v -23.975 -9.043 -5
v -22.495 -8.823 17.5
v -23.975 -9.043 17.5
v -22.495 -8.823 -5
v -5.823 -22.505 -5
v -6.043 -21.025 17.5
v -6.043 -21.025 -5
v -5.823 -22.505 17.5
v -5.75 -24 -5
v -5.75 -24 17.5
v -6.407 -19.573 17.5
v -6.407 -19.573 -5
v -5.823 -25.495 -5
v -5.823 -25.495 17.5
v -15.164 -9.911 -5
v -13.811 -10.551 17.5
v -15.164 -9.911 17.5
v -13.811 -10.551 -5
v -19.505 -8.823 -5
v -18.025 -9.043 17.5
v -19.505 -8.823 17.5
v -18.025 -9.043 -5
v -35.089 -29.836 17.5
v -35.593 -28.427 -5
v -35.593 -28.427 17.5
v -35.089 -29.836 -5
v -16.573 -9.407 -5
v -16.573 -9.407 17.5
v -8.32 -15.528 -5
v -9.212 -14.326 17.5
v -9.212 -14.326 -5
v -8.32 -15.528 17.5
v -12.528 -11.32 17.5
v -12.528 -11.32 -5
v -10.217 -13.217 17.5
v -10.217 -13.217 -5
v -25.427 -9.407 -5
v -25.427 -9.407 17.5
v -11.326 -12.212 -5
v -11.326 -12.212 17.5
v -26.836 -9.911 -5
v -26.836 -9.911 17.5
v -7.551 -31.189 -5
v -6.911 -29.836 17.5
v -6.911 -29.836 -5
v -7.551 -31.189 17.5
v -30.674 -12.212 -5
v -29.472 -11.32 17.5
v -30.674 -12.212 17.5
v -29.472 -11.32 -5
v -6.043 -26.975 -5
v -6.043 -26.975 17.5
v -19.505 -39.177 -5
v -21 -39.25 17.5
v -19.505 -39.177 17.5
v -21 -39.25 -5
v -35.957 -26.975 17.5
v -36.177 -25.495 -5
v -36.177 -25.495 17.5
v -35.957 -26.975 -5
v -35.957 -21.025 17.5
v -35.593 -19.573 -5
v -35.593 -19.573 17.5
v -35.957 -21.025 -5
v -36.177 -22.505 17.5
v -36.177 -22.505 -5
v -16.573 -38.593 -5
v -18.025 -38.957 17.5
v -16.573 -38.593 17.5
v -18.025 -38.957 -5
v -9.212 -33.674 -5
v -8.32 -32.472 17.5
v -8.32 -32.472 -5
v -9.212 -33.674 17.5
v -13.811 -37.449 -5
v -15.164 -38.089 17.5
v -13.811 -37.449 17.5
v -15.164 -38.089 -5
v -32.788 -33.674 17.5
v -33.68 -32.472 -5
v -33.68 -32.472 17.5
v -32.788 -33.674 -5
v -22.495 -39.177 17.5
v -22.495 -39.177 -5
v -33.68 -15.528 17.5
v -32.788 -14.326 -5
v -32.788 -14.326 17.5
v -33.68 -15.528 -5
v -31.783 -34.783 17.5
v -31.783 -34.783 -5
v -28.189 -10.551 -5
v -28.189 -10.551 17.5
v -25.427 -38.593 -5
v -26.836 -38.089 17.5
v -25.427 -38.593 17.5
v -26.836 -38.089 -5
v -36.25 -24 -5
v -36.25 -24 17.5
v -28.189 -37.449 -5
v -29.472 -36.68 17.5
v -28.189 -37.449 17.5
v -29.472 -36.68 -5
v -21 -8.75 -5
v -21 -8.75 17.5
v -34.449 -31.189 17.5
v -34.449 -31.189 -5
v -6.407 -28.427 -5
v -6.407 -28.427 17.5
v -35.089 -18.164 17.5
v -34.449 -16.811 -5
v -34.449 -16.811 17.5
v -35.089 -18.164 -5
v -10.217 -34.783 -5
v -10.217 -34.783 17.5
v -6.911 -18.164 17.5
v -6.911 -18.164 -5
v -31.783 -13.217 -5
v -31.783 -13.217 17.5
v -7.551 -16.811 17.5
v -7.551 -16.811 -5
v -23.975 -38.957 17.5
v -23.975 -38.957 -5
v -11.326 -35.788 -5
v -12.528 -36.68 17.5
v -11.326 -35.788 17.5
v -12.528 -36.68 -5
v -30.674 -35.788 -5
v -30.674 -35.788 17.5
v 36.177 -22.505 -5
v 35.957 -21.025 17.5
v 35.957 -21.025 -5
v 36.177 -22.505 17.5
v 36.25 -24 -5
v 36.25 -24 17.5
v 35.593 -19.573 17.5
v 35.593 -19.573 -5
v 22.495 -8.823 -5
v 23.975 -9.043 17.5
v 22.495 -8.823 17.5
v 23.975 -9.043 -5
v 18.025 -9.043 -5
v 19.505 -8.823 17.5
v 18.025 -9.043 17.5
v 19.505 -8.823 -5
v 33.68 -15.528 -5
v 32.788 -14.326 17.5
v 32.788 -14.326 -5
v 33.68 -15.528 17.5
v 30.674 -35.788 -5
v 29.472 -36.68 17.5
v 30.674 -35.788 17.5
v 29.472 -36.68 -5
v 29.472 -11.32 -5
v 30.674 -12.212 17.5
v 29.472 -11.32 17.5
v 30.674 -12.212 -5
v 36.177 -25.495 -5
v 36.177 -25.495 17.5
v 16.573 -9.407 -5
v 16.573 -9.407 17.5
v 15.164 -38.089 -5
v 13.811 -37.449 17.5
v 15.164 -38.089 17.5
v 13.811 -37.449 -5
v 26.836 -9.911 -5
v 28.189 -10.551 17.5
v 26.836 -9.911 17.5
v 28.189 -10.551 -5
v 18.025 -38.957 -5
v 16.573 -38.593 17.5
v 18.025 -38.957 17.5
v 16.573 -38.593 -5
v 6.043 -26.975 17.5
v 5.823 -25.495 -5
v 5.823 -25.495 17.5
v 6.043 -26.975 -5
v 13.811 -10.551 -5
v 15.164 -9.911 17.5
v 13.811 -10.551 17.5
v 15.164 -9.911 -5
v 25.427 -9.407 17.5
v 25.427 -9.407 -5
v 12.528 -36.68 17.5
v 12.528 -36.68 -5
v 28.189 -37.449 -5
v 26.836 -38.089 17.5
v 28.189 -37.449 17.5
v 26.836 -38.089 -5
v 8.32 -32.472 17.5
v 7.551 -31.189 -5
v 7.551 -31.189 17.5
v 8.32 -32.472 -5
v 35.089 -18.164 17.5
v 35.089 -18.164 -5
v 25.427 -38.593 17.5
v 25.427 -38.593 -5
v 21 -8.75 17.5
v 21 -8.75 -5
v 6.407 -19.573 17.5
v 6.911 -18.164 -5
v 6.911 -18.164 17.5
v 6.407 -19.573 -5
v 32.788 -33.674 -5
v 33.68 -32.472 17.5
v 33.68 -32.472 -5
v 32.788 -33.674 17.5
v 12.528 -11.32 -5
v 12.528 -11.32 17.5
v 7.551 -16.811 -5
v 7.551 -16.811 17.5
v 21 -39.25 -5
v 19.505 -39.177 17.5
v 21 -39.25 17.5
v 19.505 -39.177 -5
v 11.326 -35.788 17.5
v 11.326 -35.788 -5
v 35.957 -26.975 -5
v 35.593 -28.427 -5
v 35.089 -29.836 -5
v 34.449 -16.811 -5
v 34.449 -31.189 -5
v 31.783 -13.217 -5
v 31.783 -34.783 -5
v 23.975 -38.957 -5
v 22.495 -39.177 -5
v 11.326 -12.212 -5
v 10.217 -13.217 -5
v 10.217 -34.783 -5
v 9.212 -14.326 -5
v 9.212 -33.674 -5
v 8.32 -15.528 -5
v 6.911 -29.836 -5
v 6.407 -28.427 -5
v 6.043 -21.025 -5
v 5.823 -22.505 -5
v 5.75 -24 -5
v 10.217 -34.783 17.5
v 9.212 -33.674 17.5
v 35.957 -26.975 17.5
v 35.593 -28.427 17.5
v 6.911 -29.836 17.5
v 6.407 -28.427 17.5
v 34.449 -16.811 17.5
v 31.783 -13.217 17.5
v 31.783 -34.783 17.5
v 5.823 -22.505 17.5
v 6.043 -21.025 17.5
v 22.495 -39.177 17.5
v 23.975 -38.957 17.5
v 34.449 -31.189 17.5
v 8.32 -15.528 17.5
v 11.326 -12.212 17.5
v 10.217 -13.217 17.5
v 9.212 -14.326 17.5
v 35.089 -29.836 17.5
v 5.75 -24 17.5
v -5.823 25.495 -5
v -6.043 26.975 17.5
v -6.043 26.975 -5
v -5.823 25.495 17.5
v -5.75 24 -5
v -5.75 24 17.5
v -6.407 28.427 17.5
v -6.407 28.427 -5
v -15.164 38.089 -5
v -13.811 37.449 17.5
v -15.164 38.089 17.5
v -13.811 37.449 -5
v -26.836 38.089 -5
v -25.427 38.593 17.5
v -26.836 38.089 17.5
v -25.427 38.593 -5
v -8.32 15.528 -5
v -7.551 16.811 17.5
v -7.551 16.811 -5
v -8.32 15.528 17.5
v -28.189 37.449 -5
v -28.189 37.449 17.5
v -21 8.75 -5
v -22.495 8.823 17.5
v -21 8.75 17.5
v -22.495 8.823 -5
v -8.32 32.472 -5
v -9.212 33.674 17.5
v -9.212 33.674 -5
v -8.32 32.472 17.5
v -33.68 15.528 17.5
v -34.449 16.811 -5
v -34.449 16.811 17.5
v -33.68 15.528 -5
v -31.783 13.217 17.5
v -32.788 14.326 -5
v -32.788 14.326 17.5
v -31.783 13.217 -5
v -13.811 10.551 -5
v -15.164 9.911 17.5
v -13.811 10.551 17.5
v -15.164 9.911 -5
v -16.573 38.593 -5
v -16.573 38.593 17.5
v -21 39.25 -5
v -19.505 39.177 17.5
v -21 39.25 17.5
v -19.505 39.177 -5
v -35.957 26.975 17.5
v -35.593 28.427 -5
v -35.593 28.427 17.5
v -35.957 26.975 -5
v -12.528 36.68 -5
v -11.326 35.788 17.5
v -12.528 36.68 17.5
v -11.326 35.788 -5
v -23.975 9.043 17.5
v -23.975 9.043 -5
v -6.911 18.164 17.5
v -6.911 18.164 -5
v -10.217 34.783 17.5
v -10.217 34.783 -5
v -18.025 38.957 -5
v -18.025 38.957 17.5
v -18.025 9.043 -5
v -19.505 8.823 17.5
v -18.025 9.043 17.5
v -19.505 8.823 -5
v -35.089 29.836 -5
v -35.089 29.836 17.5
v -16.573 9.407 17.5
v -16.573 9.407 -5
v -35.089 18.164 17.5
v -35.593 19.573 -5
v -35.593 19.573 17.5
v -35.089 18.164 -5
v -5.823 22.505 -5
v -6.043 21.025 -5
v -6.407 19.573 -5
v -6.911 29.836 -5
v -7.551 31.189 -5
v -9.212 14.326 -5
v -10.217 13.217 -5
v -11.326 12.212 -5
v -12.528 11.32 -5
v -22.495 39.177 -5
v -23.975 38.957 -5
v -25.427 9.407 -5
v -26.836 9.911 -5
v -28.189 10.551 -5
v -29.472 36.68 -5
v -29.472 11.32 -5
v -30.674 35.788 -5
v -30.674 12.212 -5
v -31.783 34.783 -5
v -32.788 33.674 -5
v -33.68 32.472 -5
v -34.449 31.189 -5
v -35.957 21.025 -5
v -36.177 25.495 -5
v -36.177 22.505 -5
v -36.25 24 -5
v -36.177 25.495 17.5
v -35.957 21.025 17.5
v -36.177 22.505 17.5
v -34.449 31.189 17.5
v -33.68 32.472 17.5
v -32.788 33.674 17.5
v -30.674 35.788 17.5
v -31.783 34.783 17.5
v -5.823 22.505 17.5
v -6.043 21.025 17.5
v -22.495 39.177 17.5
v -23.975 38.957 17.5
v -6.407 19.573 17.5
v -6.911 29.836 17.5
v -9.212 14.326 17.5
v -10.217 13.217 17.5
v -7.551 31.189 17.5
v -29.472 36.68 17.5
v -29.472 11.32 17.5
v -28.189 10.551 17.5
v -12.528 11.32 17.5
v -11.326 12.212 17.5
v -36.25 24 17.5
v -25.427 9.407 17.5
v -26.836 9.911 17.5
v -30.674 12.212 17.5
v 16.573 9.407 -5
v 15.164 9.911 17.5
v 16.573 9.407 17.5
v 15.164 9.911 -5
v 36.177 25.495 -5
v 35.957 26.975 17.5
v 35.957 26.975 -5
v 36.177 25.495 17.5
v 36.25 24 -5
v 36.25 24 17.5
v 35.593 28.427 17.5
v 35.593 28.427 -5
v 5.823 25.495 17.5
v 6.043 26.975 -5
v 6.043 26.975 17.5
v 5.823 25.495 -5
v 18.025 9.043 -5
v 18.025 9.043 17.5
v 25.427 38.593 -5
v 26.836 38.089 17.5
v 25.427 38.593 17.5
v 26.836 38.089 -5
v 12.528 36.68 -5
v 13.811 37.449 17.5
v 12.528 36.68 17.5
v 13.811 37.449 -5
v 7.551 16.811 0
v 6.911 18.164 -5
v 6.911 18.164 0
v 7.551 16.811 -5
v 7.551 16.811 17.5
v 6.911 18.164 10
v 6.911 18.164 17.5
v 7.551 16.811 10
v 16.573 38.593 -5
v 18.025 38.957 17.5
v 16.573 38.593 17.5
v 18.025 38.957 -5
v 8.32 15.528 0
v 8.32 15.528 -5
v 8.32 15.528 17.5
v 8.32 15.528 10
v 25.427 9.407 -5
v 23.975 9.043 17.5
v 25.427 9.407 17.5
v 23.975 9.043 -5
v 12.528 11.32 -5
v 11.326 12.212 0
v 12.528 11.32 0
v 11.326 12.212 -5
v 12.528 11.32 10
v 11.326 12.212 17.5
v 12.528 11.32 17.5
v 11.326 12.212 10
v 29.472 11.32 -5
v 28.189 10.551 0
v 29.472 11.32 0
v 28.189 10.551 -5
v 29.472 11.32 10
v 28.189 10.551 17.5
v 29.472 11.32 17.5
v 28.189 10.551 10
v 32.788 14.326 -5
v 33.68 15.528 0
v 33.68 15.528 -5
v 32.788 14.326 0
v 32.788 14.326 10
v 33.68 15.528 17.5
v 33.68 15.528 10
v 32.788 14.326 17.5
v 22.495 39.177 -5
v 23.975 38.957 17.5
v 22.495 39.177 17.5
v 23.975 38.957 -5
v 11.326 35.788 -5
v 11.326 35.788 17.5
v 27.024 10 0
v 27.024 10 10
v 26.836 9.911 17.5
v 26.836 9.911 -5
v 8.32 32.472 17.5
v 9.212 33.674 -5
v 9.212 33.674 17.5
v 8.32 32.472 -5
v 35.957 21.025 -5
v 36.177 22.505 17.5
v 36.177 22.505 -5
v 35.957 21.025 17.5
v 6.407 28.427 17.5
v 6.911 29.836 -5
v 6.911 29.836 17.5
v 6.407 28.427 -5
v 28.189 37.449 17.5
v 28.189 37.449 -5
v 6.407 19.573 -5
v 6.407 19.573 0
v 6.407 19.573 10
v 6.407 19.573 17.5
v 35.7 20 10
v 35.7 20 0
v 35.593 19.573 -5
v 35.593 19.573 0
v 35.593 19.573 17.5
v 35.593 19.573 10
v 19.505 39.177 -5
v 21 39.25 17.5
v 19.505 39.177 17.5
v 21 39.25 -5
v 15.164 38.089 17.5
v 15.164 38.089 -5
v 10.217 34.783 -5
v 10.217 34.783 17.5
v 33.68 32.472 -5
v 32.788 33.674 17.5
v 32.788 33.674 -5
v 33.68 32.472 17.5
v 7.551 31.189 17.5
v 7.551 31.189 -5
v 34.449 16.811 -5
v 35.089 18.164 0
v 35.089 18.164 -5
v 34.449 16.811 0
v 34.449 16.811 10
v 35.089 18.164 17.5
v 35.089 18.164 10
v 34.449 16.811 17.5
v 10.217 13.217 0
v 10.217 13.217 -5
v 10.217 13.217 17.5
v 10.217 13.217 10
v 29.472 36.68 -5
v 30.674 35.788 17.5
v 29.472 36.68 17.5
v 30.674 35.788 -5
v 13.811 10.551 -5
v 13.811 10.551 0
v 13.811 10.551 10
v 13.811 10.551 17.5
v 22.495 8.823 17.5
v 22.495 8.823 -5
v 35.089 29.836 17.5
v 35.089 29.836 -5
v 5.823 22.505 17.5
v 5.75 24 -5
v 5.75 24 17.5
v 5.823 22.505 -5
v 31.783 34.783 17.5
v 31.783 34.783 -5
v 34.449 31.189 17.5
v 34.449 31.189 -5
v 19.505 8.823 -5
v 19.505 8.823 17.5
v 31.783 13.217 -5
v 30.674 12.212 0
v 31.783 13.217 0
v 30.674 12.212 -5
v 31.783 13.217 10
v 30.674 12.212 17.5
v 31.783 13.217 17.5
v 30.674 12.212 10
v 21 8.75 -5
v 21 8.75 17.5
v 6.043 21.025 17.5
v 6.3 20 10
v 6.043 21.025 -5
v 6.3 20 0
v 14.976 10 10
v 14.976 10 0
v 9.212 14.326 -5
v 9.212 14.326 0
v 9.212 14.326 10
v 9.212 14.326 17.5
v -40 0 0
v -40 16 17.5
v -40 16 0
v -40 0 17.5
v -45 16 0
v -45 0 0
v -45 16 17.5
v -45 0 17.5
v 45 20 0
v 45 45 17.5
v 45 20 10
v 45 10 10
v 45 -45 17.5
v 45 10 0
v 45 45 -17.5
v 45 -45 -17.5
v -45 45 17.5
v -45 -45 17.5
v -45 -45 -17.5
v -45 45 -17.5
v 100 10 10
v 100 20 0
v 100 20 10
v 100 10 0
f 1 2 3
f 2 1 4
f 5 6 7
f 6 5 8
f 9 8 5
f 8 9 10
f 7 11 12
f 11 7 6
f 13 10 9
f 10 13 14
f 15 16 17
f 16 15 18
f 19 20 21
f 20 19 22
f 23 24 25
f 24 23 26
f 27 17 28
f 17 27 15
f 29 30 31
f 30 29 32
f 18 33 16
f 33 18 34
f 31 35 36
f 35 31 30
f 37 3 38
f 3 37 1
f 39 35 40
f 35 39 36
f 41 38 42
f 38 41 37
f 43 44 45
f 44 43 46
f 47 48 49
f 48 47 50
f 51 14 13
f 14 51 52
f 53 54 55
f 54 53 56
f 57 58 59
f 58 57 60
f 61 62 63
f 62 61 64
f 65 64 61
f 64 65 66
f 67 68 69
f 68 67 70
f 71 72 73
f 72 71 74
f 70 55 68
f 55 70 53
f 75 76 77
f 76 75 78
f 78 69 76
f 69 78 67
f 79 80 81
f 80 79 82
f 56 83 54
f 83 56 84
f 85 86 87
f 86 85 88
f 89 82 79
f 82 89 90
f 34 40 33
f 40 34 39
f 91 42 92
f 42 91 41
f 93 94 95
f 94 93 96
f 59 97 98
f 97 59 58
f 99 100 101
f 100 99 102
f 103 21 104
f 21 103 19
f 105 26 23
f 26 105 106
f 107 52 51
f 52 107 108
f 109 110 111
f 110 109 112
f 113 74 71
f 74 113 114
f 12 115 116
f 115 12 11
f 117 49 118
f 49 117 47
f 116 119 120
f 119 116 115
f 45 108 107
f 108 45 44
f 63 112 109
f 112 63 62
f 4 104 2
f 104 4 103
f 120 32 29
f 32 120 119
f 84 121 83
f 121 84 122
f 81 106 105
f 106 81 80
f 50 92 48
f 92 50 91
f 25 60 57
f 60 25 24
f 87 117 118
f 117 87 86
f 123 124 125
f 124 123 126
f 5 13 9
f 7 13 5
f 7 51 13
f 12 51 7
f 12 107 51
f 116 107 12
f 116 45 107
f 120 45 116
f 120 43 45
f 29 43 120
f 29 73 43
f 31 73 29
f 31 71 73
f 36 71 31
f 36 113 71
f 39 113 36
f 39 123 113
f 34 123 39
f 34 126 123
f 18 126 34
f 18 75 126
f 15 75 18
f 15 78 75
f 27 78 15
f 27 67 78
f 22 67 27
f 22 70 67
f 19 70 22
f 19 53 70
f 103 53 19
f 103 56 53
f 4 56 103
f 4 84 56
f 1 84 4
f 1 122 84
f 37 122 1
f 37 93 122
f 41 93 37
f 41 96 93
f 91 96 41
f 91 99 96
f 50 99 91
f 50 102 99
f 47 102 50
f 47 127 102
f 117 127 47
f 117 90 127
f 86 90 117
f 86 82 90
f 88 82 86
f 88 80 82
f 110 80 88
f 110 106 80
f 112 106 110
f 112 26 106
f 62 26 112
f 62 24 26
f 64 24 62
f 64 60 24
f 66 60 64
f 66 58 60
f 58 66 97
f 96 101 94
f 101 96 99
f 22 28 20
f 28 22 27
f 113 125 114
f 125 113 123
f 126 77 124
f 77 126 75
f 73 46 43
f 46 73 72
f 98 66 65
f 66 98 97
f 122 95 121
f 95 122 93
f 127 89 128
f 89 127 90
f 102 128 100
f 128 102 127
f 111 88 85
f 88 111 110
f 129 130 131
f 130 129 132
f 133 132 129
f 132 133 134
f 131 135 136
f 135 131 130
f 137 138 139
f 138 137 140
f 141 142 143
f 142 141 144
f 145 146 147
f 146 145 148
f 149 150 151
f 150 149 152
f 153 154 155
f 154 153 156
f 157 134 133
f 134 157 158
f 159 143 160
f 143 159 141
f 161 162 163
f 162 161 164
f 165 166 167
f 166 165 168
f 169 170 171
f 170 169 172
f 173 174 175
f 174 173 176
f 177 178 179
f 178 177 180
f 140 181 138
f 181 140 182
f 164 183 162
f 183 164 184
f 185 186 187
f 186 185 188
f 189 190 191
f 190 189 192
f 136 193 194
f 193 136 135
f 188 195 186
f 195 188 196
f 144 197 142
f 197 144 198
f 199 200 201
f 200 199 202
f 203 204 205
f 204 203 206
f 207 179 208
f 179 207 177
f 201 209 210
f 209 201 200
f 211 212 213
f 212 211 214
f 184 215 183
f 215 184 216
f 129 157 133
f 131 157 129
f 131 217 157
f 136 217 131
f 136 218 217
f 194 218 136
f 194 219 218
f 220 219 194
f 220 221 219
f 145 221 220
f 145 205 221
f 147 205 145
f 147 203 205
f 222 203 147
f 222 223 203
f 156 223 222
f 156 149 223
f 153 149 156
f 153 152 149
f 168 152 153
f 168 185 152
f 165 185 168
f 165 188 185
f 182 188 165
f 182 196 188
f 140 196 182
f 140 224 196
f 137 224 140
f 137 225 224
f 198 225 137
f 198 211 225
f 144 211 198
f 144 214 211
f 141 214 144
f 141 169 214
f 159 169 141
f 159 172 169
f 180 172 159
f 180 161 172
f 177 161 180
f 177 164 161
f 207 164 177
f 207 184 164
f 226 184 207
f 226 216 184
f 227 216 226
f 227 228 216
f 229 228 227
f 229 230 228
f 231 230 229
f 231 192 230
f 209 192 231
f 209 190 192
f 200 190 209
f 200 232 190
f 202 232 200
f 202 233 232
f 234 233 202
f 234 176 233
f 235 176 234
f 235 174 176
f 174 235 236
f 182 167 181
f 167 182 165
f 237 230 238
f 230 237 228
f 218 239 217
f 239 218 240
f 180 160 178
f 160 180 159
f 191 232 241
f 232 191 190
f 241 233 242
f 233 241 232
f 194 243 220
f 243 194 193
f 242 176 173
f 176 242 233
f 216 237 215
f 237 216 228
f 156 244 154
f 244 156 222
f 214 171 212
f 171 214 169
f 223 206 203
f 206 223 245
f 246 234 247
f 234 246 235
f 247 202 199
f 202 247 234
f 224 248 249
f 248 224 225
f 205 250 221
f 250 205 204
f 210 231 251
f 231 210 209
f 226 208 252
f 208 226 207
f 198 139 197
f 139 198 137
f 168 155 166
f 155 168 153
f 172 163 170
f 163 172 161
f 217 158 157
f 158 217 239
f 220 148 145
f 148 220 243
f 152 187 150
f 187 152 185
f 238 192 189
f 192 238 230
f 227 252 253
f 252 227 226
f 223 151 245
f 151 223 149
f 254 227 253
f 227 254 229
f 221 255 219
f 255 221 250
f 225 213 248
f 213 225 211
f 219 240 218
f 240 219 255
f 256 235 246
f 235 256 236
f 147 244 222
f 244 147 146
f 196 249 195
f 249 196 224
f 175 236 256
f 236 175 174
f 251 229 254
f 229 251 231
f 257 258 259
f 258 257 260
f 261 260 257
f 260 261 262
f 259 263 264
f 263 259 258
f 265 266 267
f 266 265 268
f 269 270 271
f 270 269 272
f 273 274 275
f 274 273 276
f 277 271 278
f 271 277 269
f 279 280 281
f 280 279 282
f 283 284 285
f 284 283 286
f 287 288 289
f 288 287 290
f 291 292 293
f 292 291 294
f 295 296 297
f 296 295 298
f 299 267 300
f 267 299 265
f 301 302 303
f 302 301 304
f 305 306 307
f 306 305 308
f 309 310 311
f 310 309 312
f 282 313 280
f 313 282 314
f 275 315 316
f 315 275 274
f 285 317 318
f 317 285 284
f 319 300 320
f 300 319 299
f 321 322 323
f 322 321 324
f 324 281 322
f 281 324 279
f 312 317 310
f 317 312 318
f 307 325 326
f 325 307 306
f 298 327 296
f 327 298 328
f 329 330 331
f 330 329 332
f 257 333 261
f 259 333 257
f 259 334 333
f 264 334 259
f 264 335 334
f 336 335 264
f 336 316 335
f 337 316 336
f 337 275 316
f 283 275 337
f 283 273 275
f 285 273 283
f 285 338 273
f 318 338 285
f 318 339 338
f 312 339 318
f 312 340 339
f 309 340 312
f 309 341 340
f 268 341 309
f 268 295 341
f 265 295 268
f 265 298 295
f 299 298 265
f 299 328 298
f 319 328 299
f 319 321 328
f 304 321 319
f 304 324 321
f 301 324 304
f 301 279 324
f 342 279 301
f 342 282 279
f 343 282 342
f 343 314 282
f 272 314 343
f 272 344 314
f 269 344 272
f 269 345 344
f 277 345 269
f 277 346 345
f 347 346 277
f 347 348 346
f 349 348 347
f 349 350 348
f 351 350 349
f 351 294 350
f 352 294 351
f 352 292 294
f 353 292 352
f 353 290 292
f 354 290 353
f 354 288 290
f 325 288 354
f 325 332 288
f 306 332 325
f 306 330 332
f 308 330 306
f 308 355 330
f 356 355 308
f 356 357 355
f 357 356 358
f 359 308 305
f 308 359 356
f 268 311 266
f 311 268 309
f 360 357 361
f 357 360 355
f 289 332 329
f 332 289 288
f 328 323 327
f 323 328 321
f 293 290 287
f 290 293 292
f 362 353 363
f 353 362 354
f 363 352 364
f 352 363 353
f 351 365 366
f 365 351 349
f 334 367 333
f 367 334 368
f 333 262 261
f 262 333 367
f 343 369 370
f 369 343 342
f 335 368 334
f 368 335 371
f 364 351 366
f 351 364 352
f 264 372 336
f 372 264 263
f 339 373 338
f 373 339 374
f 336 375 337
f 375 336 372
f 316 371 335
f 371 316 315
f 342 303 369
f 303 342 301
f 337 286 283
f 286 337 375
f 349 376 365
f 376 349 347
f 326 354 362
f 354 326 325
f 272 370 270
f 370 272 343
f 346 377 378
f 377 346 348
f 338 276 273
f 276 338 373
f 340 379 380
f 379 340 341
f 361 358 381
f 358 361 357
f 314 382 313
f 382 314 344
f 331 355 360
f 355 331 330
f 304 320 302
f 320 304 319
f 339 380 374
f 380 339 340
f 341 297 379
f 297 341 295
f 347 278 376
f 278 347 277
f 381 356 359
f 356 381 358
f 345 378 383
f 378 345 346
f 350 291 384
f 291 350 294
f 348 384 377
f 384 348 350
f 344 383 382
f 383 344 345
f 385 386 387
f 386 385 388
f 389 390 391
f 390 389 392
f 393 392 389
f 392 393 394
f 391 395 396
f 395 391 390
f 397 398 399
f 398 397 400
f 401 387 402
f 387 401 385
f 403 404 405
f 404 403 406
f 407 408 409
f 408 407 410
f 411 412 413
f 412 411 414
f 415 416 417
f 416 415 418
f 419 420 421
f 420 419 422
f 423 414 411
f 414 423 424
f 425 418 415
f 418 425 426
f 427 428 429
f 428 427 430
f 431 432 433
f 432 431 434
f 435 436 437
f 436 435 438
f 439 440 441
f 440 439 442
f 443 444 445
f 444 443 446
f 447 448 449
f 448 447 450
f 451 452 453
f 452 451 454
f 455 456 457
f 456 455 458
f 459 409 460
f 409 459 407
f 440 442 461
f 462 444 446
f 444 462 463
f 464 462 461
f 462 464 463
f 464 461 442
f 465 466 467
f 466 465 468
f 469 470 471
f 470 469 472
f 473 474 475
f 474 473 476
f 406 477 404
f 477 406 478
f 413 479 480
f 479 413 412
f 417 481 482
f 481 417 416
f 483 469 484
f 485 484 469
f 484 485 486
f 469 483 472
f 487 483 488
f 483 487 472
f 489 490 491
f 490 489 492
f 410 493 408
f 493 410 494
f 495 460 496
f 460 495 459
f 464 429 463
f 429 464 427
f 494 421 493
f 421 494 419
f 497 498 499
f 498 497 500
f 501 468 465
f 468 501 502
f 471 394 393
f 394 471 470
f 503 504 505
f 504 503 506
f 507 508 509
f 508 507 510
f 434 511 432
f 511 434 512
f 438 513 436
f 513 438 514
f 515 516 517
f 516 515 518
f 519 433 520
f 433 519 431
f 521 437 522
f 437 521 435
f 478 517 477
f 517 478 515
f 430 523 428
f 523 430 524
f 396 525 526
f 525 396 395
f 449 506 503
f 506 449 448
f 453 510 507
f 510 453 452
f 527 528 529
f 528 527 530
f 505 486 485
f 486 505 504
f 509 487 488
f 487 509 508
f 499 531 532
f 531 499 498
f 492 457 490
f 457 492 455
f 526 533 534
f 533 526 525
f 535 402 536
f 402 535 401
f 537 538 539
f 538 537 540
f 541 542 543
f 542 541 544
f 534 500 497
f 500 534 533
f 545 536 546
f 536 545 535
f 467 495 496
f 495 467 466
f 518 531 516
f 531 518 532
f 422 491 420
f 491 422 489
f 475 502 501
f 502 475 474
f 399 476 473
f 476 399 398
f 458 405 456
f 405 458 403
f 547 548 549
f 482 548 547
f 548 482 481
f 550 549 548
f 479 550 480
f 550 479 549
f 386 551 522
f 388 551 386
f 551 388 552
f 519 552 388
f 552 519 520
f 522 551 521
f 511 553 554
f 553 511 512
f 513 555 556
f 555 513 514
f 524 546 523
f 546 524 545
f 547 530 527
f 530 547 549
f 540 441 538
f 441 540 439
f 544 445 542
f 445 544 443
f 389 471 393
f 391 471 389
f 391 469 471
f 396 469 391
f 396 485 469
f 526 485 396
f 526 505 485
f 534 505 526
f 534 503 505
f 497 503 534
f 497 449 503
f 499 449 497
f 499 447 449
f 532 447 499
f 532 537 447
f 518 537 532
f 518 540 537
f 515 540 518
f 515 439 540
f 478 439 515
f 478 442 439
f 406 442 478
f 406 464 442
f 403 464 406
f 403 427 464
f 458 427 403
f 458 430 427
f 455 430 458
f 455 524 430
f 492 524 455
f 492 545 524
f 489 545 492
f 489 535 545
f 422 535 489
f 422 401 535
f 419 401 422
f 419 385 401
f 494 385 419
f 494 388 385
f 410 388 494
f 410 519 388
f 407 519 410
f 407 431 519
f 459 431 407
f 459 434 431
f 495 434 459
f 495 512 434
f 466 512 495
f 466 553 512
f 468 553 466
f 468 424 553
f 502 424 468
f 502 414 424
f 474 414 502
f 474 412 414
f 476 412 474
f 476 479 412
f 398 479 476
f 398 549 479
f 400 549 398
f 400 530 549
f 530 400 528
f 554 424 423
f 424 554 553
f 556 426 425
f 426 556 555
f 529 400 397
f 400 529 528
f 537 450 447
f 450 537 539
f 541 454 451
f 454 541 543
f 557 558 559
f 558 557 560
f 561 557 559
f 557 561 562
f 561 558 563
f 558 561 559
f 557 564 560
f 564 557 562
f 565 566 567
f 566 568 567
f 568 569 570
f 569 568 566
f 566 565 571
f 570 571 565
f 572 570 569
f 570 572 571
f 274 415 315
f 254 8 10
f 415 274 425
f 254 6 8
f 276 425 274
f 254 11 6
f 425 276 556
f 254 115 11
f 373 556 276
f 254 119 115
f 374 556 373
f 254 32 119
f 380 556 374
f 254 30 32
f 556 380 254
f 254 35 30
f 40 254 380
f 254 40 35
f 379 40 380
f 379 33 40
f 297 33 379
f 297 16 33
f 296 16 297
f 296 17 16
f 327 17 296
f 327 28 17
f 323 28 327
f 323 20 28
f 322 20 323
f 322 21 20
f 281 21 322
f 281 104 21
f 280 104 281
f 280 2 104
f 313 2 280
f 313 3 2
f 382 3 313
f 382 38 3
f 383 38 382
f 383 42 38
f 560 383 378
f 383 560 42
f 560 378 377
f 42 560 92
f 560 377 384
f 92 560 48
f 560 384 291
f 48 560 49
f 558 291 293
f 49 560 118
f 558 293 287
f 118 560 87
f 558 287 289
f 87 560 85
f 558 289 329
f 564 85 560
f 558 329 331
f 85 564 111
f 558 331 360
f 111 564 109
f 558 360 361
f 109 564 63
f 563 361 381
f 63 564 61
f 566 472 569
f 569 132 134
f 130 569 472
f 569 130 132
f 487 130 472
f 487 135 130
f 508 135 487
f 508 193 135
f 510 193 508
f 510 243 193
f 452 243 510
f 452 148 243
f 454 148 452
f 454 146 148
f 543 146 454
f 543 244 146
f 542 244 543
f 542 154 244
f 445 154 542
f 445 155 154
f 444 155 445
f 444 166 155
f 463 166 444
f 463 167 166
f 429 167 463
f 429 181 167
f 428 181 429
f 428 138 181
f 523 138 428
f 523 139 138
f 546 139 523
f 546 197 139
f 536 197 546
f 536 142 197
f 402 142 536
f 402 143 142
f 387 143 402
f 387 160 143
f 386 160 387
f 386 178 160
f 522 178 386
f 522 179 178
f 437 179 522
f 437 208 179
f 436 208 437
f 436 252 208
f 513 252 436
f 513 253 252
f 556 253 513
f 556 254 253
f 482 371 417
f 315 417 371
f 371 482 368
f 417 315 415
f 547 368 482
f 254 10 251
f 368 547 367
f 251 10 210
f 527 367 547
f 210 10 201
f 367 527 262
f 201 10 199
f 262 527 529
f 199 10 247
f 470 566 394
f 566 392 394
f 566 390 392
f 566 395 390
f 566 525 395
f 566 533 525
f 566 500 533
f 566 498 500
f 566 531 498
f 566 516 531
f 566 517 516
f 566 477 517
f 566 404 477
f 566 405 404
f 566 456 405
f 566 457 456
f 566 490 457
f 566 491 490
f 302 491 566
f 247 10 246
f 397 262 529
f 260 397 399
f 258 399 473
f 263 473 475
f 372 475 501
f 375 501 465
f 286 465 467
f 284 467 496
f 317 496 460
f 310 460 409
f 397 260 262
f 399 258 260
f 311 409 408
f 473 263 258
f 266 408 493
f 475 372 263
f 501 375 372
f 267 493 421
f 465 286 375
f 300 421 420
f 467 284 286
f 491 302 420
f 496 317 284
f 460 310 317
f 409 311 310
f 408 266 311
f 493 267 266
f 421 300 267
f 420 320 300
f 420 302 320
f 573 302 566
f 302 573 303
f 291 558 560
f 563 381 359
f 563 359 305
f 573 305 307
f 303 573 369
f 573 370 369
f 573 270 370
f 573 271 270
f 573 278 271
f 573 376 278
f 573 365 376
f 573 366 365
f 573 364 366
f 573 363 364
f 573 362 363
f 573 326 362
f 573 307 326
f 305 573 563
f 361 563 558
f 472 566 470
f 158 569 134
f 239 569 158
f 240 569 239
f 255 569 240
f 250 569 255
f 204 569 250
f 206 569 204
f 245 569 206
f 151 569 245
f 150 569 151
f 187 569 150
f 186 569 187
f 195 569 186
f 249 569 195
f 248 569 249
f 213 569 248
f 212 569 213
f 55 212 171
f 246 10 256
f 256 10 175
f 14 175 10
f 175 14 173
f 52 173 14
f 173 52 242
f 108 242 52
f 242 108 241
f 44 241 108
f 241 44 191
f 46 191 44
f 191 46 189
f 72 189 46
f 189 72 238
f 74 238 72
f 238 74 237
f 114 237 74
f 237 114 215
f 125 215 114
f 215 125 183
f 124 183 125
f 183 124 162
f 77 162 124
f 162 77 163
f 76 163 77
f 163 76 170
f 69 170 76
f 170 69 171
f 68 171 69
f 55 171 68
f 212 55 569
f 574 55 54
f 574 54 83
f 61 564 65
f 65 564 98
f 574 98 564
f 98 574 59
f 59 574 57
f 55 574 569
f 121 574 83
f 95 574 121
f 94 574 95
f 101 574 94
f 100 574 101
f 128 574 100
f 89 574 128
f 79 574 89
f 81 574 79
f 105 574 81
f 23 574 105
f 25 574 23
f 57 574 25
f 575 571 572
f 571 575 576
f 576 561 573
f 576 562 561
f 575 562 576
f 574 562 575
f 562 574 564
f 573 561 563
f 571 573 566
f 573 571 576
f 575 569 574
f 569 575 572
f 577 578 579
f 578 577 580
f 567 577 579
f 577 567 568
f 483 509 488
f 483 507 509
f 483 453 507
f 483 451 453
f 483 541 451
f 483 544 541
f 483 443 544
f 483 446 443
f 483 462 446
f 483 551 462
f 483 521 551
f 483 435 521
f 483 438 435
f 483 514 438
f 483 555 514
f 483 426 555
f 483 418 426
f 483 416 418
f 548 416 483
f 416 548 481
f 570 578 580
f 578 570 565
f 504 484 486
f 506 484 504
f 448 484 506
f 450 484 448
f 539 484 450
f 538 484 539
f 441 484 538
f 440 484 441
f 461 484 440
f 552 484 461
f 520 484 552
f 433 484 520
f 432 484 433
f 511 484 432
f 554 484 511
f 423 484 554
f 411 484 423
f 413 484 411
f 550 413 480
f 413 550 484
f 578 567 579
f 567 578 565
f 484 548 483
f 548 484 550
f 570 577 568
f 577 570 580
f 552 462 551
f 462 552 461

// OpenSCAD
// --- Dimensions for Part 1: Base Block and Posts ---

// Base block dimensions
base_size_x = 90; // mm
base_size_y = 90; // mm
base_height = 35; // mm

// Tube seat dimensions
tube_diameter = 30.5; // mm
tube_depth = 30; // mm
floor_thickness = 5; // mm

// Tube seat positions (relative to center)
seat_x1 = -21; // mm
seat_x2 = 21;  // mm
seat_y1 = -24; // mm
seat_y2 = 24;  // mm

// Post dimensions
post_thickness_x = 10; // mm (X dimension)
post_width_y = 16;    // mm (Y dimension)
post_height = 160;    // mm
hole_size = 10.4;     // mm
hole_diameter = 10.4; // mm

// Post hole position (centered along X, at Z=150)
hole_z_center = 150; // mm

// --- Dimensions for Part 2: Handle ---

handle_width = 10;  // mm
handle_height = 10; // mm
handle_length = 100; // mm

// Handle placement relative to base (+Y face)
handle_gap_y = 10; // mm (Gap from +Y face of base, which is at Y=45)
handle_center_x = 0; // mm

// --- Global Settings ---
$fn = 64;

// ======================================================================
// PART 1: BASE BLOCK AND POSTS
// ======================================================================

module part1() {
    difference() {
        // 1. Base Block (Solid)
        cube([base_size_x, base_size_y, base_height], center = true);

        // 2. Tube Seat Cutouts (4 holes)
        translate([0, 0, -floor_thickness]) { // Start cutting from the bottom surface
            for (i = [1:4]) {
                if (i == 1) { // Seat 1: (-X, -Y)
                    translate([seat_x1, seat_y1, 0])
                        cylinder(h = tube_depth + 1, r = tube_diameter / 2);
                } else if (i == 2) { // Seat 2: (+X, -Y)
                    translate([seat_x2, seat_y1, 0])
                        cylinder(h = tube_depth + 1, r = tube_diameter / 2);
                } else if (i == 3) { // Seat 3: (-X, +Y)
                    translate([seat_x1, seat_y2, 0])
                        cylinder(h = tube_depth + 1, r = tube_diameter / 2);
                } else { // Seat 4: (+X, +Y)
                    translate([seat_x2, seat_y2, 0])
                        cylinder(h = tube_depth + 1, r = tube_diameter / 2);
                }
            }
        }

        // 3. Posts (Two posts on X ends)
        // Post 1: Left side (-X end)
        translate([-base_size_x/2 - post_thickness_x/2, 0, 0]) {
            cube([post_thickness_x, post_width_y, post_height]);

            // Hole through Post 1 (along X axis)
            translate([hole_diameter/2 + 0.01, 0, hole_z_center - post_height/2]) {
                cube([hole_size - 0.02, post_width_y + 0.02, post_height]);
            }
        }

        // Post 2: Right side (+X end)
        translate([base_size_x/2 + post_thickness_x/2, 0, 0]) {
            cube([post_thickness_x, post_width_y, post_height]);

            // Hole through Post 2 (along X axis)
            translate([-hole_diameter/2 - 0.01, 0, hole_z_center - post_height/2]) {
                cube([hole_size - 0.02, post_width_y + 0.02, post_height]);
            }
        }

    }
}


// ======================================================================
// PART 2: HANDLE
// ======================================================================

module part2() {
    // The handle needs to span Y from (Base_Y_Max + Gap) to (Base_Y_Max + Gap + Handle_Height)
    // Base Max Y is base_size_y / 2 = 45 mm.
    // Start Y position: 45 + 10 = 55 mm
    // End Y position: 55 + 10 = 65 mm

    translate([handle_center_x, handle_gap_y, 0]) {
        cube([handle_length, handle_height, handle_width]);
    }
}


// ======================================================================
// FINAL ASSEMBLY (Rendered as two separate parts)
// ======================================================================

// Render Part 1: Base Block and Posts
color("gray") {
    part1();
}

// Render Part 2: Handle
color("blue") {
    part2();
}
